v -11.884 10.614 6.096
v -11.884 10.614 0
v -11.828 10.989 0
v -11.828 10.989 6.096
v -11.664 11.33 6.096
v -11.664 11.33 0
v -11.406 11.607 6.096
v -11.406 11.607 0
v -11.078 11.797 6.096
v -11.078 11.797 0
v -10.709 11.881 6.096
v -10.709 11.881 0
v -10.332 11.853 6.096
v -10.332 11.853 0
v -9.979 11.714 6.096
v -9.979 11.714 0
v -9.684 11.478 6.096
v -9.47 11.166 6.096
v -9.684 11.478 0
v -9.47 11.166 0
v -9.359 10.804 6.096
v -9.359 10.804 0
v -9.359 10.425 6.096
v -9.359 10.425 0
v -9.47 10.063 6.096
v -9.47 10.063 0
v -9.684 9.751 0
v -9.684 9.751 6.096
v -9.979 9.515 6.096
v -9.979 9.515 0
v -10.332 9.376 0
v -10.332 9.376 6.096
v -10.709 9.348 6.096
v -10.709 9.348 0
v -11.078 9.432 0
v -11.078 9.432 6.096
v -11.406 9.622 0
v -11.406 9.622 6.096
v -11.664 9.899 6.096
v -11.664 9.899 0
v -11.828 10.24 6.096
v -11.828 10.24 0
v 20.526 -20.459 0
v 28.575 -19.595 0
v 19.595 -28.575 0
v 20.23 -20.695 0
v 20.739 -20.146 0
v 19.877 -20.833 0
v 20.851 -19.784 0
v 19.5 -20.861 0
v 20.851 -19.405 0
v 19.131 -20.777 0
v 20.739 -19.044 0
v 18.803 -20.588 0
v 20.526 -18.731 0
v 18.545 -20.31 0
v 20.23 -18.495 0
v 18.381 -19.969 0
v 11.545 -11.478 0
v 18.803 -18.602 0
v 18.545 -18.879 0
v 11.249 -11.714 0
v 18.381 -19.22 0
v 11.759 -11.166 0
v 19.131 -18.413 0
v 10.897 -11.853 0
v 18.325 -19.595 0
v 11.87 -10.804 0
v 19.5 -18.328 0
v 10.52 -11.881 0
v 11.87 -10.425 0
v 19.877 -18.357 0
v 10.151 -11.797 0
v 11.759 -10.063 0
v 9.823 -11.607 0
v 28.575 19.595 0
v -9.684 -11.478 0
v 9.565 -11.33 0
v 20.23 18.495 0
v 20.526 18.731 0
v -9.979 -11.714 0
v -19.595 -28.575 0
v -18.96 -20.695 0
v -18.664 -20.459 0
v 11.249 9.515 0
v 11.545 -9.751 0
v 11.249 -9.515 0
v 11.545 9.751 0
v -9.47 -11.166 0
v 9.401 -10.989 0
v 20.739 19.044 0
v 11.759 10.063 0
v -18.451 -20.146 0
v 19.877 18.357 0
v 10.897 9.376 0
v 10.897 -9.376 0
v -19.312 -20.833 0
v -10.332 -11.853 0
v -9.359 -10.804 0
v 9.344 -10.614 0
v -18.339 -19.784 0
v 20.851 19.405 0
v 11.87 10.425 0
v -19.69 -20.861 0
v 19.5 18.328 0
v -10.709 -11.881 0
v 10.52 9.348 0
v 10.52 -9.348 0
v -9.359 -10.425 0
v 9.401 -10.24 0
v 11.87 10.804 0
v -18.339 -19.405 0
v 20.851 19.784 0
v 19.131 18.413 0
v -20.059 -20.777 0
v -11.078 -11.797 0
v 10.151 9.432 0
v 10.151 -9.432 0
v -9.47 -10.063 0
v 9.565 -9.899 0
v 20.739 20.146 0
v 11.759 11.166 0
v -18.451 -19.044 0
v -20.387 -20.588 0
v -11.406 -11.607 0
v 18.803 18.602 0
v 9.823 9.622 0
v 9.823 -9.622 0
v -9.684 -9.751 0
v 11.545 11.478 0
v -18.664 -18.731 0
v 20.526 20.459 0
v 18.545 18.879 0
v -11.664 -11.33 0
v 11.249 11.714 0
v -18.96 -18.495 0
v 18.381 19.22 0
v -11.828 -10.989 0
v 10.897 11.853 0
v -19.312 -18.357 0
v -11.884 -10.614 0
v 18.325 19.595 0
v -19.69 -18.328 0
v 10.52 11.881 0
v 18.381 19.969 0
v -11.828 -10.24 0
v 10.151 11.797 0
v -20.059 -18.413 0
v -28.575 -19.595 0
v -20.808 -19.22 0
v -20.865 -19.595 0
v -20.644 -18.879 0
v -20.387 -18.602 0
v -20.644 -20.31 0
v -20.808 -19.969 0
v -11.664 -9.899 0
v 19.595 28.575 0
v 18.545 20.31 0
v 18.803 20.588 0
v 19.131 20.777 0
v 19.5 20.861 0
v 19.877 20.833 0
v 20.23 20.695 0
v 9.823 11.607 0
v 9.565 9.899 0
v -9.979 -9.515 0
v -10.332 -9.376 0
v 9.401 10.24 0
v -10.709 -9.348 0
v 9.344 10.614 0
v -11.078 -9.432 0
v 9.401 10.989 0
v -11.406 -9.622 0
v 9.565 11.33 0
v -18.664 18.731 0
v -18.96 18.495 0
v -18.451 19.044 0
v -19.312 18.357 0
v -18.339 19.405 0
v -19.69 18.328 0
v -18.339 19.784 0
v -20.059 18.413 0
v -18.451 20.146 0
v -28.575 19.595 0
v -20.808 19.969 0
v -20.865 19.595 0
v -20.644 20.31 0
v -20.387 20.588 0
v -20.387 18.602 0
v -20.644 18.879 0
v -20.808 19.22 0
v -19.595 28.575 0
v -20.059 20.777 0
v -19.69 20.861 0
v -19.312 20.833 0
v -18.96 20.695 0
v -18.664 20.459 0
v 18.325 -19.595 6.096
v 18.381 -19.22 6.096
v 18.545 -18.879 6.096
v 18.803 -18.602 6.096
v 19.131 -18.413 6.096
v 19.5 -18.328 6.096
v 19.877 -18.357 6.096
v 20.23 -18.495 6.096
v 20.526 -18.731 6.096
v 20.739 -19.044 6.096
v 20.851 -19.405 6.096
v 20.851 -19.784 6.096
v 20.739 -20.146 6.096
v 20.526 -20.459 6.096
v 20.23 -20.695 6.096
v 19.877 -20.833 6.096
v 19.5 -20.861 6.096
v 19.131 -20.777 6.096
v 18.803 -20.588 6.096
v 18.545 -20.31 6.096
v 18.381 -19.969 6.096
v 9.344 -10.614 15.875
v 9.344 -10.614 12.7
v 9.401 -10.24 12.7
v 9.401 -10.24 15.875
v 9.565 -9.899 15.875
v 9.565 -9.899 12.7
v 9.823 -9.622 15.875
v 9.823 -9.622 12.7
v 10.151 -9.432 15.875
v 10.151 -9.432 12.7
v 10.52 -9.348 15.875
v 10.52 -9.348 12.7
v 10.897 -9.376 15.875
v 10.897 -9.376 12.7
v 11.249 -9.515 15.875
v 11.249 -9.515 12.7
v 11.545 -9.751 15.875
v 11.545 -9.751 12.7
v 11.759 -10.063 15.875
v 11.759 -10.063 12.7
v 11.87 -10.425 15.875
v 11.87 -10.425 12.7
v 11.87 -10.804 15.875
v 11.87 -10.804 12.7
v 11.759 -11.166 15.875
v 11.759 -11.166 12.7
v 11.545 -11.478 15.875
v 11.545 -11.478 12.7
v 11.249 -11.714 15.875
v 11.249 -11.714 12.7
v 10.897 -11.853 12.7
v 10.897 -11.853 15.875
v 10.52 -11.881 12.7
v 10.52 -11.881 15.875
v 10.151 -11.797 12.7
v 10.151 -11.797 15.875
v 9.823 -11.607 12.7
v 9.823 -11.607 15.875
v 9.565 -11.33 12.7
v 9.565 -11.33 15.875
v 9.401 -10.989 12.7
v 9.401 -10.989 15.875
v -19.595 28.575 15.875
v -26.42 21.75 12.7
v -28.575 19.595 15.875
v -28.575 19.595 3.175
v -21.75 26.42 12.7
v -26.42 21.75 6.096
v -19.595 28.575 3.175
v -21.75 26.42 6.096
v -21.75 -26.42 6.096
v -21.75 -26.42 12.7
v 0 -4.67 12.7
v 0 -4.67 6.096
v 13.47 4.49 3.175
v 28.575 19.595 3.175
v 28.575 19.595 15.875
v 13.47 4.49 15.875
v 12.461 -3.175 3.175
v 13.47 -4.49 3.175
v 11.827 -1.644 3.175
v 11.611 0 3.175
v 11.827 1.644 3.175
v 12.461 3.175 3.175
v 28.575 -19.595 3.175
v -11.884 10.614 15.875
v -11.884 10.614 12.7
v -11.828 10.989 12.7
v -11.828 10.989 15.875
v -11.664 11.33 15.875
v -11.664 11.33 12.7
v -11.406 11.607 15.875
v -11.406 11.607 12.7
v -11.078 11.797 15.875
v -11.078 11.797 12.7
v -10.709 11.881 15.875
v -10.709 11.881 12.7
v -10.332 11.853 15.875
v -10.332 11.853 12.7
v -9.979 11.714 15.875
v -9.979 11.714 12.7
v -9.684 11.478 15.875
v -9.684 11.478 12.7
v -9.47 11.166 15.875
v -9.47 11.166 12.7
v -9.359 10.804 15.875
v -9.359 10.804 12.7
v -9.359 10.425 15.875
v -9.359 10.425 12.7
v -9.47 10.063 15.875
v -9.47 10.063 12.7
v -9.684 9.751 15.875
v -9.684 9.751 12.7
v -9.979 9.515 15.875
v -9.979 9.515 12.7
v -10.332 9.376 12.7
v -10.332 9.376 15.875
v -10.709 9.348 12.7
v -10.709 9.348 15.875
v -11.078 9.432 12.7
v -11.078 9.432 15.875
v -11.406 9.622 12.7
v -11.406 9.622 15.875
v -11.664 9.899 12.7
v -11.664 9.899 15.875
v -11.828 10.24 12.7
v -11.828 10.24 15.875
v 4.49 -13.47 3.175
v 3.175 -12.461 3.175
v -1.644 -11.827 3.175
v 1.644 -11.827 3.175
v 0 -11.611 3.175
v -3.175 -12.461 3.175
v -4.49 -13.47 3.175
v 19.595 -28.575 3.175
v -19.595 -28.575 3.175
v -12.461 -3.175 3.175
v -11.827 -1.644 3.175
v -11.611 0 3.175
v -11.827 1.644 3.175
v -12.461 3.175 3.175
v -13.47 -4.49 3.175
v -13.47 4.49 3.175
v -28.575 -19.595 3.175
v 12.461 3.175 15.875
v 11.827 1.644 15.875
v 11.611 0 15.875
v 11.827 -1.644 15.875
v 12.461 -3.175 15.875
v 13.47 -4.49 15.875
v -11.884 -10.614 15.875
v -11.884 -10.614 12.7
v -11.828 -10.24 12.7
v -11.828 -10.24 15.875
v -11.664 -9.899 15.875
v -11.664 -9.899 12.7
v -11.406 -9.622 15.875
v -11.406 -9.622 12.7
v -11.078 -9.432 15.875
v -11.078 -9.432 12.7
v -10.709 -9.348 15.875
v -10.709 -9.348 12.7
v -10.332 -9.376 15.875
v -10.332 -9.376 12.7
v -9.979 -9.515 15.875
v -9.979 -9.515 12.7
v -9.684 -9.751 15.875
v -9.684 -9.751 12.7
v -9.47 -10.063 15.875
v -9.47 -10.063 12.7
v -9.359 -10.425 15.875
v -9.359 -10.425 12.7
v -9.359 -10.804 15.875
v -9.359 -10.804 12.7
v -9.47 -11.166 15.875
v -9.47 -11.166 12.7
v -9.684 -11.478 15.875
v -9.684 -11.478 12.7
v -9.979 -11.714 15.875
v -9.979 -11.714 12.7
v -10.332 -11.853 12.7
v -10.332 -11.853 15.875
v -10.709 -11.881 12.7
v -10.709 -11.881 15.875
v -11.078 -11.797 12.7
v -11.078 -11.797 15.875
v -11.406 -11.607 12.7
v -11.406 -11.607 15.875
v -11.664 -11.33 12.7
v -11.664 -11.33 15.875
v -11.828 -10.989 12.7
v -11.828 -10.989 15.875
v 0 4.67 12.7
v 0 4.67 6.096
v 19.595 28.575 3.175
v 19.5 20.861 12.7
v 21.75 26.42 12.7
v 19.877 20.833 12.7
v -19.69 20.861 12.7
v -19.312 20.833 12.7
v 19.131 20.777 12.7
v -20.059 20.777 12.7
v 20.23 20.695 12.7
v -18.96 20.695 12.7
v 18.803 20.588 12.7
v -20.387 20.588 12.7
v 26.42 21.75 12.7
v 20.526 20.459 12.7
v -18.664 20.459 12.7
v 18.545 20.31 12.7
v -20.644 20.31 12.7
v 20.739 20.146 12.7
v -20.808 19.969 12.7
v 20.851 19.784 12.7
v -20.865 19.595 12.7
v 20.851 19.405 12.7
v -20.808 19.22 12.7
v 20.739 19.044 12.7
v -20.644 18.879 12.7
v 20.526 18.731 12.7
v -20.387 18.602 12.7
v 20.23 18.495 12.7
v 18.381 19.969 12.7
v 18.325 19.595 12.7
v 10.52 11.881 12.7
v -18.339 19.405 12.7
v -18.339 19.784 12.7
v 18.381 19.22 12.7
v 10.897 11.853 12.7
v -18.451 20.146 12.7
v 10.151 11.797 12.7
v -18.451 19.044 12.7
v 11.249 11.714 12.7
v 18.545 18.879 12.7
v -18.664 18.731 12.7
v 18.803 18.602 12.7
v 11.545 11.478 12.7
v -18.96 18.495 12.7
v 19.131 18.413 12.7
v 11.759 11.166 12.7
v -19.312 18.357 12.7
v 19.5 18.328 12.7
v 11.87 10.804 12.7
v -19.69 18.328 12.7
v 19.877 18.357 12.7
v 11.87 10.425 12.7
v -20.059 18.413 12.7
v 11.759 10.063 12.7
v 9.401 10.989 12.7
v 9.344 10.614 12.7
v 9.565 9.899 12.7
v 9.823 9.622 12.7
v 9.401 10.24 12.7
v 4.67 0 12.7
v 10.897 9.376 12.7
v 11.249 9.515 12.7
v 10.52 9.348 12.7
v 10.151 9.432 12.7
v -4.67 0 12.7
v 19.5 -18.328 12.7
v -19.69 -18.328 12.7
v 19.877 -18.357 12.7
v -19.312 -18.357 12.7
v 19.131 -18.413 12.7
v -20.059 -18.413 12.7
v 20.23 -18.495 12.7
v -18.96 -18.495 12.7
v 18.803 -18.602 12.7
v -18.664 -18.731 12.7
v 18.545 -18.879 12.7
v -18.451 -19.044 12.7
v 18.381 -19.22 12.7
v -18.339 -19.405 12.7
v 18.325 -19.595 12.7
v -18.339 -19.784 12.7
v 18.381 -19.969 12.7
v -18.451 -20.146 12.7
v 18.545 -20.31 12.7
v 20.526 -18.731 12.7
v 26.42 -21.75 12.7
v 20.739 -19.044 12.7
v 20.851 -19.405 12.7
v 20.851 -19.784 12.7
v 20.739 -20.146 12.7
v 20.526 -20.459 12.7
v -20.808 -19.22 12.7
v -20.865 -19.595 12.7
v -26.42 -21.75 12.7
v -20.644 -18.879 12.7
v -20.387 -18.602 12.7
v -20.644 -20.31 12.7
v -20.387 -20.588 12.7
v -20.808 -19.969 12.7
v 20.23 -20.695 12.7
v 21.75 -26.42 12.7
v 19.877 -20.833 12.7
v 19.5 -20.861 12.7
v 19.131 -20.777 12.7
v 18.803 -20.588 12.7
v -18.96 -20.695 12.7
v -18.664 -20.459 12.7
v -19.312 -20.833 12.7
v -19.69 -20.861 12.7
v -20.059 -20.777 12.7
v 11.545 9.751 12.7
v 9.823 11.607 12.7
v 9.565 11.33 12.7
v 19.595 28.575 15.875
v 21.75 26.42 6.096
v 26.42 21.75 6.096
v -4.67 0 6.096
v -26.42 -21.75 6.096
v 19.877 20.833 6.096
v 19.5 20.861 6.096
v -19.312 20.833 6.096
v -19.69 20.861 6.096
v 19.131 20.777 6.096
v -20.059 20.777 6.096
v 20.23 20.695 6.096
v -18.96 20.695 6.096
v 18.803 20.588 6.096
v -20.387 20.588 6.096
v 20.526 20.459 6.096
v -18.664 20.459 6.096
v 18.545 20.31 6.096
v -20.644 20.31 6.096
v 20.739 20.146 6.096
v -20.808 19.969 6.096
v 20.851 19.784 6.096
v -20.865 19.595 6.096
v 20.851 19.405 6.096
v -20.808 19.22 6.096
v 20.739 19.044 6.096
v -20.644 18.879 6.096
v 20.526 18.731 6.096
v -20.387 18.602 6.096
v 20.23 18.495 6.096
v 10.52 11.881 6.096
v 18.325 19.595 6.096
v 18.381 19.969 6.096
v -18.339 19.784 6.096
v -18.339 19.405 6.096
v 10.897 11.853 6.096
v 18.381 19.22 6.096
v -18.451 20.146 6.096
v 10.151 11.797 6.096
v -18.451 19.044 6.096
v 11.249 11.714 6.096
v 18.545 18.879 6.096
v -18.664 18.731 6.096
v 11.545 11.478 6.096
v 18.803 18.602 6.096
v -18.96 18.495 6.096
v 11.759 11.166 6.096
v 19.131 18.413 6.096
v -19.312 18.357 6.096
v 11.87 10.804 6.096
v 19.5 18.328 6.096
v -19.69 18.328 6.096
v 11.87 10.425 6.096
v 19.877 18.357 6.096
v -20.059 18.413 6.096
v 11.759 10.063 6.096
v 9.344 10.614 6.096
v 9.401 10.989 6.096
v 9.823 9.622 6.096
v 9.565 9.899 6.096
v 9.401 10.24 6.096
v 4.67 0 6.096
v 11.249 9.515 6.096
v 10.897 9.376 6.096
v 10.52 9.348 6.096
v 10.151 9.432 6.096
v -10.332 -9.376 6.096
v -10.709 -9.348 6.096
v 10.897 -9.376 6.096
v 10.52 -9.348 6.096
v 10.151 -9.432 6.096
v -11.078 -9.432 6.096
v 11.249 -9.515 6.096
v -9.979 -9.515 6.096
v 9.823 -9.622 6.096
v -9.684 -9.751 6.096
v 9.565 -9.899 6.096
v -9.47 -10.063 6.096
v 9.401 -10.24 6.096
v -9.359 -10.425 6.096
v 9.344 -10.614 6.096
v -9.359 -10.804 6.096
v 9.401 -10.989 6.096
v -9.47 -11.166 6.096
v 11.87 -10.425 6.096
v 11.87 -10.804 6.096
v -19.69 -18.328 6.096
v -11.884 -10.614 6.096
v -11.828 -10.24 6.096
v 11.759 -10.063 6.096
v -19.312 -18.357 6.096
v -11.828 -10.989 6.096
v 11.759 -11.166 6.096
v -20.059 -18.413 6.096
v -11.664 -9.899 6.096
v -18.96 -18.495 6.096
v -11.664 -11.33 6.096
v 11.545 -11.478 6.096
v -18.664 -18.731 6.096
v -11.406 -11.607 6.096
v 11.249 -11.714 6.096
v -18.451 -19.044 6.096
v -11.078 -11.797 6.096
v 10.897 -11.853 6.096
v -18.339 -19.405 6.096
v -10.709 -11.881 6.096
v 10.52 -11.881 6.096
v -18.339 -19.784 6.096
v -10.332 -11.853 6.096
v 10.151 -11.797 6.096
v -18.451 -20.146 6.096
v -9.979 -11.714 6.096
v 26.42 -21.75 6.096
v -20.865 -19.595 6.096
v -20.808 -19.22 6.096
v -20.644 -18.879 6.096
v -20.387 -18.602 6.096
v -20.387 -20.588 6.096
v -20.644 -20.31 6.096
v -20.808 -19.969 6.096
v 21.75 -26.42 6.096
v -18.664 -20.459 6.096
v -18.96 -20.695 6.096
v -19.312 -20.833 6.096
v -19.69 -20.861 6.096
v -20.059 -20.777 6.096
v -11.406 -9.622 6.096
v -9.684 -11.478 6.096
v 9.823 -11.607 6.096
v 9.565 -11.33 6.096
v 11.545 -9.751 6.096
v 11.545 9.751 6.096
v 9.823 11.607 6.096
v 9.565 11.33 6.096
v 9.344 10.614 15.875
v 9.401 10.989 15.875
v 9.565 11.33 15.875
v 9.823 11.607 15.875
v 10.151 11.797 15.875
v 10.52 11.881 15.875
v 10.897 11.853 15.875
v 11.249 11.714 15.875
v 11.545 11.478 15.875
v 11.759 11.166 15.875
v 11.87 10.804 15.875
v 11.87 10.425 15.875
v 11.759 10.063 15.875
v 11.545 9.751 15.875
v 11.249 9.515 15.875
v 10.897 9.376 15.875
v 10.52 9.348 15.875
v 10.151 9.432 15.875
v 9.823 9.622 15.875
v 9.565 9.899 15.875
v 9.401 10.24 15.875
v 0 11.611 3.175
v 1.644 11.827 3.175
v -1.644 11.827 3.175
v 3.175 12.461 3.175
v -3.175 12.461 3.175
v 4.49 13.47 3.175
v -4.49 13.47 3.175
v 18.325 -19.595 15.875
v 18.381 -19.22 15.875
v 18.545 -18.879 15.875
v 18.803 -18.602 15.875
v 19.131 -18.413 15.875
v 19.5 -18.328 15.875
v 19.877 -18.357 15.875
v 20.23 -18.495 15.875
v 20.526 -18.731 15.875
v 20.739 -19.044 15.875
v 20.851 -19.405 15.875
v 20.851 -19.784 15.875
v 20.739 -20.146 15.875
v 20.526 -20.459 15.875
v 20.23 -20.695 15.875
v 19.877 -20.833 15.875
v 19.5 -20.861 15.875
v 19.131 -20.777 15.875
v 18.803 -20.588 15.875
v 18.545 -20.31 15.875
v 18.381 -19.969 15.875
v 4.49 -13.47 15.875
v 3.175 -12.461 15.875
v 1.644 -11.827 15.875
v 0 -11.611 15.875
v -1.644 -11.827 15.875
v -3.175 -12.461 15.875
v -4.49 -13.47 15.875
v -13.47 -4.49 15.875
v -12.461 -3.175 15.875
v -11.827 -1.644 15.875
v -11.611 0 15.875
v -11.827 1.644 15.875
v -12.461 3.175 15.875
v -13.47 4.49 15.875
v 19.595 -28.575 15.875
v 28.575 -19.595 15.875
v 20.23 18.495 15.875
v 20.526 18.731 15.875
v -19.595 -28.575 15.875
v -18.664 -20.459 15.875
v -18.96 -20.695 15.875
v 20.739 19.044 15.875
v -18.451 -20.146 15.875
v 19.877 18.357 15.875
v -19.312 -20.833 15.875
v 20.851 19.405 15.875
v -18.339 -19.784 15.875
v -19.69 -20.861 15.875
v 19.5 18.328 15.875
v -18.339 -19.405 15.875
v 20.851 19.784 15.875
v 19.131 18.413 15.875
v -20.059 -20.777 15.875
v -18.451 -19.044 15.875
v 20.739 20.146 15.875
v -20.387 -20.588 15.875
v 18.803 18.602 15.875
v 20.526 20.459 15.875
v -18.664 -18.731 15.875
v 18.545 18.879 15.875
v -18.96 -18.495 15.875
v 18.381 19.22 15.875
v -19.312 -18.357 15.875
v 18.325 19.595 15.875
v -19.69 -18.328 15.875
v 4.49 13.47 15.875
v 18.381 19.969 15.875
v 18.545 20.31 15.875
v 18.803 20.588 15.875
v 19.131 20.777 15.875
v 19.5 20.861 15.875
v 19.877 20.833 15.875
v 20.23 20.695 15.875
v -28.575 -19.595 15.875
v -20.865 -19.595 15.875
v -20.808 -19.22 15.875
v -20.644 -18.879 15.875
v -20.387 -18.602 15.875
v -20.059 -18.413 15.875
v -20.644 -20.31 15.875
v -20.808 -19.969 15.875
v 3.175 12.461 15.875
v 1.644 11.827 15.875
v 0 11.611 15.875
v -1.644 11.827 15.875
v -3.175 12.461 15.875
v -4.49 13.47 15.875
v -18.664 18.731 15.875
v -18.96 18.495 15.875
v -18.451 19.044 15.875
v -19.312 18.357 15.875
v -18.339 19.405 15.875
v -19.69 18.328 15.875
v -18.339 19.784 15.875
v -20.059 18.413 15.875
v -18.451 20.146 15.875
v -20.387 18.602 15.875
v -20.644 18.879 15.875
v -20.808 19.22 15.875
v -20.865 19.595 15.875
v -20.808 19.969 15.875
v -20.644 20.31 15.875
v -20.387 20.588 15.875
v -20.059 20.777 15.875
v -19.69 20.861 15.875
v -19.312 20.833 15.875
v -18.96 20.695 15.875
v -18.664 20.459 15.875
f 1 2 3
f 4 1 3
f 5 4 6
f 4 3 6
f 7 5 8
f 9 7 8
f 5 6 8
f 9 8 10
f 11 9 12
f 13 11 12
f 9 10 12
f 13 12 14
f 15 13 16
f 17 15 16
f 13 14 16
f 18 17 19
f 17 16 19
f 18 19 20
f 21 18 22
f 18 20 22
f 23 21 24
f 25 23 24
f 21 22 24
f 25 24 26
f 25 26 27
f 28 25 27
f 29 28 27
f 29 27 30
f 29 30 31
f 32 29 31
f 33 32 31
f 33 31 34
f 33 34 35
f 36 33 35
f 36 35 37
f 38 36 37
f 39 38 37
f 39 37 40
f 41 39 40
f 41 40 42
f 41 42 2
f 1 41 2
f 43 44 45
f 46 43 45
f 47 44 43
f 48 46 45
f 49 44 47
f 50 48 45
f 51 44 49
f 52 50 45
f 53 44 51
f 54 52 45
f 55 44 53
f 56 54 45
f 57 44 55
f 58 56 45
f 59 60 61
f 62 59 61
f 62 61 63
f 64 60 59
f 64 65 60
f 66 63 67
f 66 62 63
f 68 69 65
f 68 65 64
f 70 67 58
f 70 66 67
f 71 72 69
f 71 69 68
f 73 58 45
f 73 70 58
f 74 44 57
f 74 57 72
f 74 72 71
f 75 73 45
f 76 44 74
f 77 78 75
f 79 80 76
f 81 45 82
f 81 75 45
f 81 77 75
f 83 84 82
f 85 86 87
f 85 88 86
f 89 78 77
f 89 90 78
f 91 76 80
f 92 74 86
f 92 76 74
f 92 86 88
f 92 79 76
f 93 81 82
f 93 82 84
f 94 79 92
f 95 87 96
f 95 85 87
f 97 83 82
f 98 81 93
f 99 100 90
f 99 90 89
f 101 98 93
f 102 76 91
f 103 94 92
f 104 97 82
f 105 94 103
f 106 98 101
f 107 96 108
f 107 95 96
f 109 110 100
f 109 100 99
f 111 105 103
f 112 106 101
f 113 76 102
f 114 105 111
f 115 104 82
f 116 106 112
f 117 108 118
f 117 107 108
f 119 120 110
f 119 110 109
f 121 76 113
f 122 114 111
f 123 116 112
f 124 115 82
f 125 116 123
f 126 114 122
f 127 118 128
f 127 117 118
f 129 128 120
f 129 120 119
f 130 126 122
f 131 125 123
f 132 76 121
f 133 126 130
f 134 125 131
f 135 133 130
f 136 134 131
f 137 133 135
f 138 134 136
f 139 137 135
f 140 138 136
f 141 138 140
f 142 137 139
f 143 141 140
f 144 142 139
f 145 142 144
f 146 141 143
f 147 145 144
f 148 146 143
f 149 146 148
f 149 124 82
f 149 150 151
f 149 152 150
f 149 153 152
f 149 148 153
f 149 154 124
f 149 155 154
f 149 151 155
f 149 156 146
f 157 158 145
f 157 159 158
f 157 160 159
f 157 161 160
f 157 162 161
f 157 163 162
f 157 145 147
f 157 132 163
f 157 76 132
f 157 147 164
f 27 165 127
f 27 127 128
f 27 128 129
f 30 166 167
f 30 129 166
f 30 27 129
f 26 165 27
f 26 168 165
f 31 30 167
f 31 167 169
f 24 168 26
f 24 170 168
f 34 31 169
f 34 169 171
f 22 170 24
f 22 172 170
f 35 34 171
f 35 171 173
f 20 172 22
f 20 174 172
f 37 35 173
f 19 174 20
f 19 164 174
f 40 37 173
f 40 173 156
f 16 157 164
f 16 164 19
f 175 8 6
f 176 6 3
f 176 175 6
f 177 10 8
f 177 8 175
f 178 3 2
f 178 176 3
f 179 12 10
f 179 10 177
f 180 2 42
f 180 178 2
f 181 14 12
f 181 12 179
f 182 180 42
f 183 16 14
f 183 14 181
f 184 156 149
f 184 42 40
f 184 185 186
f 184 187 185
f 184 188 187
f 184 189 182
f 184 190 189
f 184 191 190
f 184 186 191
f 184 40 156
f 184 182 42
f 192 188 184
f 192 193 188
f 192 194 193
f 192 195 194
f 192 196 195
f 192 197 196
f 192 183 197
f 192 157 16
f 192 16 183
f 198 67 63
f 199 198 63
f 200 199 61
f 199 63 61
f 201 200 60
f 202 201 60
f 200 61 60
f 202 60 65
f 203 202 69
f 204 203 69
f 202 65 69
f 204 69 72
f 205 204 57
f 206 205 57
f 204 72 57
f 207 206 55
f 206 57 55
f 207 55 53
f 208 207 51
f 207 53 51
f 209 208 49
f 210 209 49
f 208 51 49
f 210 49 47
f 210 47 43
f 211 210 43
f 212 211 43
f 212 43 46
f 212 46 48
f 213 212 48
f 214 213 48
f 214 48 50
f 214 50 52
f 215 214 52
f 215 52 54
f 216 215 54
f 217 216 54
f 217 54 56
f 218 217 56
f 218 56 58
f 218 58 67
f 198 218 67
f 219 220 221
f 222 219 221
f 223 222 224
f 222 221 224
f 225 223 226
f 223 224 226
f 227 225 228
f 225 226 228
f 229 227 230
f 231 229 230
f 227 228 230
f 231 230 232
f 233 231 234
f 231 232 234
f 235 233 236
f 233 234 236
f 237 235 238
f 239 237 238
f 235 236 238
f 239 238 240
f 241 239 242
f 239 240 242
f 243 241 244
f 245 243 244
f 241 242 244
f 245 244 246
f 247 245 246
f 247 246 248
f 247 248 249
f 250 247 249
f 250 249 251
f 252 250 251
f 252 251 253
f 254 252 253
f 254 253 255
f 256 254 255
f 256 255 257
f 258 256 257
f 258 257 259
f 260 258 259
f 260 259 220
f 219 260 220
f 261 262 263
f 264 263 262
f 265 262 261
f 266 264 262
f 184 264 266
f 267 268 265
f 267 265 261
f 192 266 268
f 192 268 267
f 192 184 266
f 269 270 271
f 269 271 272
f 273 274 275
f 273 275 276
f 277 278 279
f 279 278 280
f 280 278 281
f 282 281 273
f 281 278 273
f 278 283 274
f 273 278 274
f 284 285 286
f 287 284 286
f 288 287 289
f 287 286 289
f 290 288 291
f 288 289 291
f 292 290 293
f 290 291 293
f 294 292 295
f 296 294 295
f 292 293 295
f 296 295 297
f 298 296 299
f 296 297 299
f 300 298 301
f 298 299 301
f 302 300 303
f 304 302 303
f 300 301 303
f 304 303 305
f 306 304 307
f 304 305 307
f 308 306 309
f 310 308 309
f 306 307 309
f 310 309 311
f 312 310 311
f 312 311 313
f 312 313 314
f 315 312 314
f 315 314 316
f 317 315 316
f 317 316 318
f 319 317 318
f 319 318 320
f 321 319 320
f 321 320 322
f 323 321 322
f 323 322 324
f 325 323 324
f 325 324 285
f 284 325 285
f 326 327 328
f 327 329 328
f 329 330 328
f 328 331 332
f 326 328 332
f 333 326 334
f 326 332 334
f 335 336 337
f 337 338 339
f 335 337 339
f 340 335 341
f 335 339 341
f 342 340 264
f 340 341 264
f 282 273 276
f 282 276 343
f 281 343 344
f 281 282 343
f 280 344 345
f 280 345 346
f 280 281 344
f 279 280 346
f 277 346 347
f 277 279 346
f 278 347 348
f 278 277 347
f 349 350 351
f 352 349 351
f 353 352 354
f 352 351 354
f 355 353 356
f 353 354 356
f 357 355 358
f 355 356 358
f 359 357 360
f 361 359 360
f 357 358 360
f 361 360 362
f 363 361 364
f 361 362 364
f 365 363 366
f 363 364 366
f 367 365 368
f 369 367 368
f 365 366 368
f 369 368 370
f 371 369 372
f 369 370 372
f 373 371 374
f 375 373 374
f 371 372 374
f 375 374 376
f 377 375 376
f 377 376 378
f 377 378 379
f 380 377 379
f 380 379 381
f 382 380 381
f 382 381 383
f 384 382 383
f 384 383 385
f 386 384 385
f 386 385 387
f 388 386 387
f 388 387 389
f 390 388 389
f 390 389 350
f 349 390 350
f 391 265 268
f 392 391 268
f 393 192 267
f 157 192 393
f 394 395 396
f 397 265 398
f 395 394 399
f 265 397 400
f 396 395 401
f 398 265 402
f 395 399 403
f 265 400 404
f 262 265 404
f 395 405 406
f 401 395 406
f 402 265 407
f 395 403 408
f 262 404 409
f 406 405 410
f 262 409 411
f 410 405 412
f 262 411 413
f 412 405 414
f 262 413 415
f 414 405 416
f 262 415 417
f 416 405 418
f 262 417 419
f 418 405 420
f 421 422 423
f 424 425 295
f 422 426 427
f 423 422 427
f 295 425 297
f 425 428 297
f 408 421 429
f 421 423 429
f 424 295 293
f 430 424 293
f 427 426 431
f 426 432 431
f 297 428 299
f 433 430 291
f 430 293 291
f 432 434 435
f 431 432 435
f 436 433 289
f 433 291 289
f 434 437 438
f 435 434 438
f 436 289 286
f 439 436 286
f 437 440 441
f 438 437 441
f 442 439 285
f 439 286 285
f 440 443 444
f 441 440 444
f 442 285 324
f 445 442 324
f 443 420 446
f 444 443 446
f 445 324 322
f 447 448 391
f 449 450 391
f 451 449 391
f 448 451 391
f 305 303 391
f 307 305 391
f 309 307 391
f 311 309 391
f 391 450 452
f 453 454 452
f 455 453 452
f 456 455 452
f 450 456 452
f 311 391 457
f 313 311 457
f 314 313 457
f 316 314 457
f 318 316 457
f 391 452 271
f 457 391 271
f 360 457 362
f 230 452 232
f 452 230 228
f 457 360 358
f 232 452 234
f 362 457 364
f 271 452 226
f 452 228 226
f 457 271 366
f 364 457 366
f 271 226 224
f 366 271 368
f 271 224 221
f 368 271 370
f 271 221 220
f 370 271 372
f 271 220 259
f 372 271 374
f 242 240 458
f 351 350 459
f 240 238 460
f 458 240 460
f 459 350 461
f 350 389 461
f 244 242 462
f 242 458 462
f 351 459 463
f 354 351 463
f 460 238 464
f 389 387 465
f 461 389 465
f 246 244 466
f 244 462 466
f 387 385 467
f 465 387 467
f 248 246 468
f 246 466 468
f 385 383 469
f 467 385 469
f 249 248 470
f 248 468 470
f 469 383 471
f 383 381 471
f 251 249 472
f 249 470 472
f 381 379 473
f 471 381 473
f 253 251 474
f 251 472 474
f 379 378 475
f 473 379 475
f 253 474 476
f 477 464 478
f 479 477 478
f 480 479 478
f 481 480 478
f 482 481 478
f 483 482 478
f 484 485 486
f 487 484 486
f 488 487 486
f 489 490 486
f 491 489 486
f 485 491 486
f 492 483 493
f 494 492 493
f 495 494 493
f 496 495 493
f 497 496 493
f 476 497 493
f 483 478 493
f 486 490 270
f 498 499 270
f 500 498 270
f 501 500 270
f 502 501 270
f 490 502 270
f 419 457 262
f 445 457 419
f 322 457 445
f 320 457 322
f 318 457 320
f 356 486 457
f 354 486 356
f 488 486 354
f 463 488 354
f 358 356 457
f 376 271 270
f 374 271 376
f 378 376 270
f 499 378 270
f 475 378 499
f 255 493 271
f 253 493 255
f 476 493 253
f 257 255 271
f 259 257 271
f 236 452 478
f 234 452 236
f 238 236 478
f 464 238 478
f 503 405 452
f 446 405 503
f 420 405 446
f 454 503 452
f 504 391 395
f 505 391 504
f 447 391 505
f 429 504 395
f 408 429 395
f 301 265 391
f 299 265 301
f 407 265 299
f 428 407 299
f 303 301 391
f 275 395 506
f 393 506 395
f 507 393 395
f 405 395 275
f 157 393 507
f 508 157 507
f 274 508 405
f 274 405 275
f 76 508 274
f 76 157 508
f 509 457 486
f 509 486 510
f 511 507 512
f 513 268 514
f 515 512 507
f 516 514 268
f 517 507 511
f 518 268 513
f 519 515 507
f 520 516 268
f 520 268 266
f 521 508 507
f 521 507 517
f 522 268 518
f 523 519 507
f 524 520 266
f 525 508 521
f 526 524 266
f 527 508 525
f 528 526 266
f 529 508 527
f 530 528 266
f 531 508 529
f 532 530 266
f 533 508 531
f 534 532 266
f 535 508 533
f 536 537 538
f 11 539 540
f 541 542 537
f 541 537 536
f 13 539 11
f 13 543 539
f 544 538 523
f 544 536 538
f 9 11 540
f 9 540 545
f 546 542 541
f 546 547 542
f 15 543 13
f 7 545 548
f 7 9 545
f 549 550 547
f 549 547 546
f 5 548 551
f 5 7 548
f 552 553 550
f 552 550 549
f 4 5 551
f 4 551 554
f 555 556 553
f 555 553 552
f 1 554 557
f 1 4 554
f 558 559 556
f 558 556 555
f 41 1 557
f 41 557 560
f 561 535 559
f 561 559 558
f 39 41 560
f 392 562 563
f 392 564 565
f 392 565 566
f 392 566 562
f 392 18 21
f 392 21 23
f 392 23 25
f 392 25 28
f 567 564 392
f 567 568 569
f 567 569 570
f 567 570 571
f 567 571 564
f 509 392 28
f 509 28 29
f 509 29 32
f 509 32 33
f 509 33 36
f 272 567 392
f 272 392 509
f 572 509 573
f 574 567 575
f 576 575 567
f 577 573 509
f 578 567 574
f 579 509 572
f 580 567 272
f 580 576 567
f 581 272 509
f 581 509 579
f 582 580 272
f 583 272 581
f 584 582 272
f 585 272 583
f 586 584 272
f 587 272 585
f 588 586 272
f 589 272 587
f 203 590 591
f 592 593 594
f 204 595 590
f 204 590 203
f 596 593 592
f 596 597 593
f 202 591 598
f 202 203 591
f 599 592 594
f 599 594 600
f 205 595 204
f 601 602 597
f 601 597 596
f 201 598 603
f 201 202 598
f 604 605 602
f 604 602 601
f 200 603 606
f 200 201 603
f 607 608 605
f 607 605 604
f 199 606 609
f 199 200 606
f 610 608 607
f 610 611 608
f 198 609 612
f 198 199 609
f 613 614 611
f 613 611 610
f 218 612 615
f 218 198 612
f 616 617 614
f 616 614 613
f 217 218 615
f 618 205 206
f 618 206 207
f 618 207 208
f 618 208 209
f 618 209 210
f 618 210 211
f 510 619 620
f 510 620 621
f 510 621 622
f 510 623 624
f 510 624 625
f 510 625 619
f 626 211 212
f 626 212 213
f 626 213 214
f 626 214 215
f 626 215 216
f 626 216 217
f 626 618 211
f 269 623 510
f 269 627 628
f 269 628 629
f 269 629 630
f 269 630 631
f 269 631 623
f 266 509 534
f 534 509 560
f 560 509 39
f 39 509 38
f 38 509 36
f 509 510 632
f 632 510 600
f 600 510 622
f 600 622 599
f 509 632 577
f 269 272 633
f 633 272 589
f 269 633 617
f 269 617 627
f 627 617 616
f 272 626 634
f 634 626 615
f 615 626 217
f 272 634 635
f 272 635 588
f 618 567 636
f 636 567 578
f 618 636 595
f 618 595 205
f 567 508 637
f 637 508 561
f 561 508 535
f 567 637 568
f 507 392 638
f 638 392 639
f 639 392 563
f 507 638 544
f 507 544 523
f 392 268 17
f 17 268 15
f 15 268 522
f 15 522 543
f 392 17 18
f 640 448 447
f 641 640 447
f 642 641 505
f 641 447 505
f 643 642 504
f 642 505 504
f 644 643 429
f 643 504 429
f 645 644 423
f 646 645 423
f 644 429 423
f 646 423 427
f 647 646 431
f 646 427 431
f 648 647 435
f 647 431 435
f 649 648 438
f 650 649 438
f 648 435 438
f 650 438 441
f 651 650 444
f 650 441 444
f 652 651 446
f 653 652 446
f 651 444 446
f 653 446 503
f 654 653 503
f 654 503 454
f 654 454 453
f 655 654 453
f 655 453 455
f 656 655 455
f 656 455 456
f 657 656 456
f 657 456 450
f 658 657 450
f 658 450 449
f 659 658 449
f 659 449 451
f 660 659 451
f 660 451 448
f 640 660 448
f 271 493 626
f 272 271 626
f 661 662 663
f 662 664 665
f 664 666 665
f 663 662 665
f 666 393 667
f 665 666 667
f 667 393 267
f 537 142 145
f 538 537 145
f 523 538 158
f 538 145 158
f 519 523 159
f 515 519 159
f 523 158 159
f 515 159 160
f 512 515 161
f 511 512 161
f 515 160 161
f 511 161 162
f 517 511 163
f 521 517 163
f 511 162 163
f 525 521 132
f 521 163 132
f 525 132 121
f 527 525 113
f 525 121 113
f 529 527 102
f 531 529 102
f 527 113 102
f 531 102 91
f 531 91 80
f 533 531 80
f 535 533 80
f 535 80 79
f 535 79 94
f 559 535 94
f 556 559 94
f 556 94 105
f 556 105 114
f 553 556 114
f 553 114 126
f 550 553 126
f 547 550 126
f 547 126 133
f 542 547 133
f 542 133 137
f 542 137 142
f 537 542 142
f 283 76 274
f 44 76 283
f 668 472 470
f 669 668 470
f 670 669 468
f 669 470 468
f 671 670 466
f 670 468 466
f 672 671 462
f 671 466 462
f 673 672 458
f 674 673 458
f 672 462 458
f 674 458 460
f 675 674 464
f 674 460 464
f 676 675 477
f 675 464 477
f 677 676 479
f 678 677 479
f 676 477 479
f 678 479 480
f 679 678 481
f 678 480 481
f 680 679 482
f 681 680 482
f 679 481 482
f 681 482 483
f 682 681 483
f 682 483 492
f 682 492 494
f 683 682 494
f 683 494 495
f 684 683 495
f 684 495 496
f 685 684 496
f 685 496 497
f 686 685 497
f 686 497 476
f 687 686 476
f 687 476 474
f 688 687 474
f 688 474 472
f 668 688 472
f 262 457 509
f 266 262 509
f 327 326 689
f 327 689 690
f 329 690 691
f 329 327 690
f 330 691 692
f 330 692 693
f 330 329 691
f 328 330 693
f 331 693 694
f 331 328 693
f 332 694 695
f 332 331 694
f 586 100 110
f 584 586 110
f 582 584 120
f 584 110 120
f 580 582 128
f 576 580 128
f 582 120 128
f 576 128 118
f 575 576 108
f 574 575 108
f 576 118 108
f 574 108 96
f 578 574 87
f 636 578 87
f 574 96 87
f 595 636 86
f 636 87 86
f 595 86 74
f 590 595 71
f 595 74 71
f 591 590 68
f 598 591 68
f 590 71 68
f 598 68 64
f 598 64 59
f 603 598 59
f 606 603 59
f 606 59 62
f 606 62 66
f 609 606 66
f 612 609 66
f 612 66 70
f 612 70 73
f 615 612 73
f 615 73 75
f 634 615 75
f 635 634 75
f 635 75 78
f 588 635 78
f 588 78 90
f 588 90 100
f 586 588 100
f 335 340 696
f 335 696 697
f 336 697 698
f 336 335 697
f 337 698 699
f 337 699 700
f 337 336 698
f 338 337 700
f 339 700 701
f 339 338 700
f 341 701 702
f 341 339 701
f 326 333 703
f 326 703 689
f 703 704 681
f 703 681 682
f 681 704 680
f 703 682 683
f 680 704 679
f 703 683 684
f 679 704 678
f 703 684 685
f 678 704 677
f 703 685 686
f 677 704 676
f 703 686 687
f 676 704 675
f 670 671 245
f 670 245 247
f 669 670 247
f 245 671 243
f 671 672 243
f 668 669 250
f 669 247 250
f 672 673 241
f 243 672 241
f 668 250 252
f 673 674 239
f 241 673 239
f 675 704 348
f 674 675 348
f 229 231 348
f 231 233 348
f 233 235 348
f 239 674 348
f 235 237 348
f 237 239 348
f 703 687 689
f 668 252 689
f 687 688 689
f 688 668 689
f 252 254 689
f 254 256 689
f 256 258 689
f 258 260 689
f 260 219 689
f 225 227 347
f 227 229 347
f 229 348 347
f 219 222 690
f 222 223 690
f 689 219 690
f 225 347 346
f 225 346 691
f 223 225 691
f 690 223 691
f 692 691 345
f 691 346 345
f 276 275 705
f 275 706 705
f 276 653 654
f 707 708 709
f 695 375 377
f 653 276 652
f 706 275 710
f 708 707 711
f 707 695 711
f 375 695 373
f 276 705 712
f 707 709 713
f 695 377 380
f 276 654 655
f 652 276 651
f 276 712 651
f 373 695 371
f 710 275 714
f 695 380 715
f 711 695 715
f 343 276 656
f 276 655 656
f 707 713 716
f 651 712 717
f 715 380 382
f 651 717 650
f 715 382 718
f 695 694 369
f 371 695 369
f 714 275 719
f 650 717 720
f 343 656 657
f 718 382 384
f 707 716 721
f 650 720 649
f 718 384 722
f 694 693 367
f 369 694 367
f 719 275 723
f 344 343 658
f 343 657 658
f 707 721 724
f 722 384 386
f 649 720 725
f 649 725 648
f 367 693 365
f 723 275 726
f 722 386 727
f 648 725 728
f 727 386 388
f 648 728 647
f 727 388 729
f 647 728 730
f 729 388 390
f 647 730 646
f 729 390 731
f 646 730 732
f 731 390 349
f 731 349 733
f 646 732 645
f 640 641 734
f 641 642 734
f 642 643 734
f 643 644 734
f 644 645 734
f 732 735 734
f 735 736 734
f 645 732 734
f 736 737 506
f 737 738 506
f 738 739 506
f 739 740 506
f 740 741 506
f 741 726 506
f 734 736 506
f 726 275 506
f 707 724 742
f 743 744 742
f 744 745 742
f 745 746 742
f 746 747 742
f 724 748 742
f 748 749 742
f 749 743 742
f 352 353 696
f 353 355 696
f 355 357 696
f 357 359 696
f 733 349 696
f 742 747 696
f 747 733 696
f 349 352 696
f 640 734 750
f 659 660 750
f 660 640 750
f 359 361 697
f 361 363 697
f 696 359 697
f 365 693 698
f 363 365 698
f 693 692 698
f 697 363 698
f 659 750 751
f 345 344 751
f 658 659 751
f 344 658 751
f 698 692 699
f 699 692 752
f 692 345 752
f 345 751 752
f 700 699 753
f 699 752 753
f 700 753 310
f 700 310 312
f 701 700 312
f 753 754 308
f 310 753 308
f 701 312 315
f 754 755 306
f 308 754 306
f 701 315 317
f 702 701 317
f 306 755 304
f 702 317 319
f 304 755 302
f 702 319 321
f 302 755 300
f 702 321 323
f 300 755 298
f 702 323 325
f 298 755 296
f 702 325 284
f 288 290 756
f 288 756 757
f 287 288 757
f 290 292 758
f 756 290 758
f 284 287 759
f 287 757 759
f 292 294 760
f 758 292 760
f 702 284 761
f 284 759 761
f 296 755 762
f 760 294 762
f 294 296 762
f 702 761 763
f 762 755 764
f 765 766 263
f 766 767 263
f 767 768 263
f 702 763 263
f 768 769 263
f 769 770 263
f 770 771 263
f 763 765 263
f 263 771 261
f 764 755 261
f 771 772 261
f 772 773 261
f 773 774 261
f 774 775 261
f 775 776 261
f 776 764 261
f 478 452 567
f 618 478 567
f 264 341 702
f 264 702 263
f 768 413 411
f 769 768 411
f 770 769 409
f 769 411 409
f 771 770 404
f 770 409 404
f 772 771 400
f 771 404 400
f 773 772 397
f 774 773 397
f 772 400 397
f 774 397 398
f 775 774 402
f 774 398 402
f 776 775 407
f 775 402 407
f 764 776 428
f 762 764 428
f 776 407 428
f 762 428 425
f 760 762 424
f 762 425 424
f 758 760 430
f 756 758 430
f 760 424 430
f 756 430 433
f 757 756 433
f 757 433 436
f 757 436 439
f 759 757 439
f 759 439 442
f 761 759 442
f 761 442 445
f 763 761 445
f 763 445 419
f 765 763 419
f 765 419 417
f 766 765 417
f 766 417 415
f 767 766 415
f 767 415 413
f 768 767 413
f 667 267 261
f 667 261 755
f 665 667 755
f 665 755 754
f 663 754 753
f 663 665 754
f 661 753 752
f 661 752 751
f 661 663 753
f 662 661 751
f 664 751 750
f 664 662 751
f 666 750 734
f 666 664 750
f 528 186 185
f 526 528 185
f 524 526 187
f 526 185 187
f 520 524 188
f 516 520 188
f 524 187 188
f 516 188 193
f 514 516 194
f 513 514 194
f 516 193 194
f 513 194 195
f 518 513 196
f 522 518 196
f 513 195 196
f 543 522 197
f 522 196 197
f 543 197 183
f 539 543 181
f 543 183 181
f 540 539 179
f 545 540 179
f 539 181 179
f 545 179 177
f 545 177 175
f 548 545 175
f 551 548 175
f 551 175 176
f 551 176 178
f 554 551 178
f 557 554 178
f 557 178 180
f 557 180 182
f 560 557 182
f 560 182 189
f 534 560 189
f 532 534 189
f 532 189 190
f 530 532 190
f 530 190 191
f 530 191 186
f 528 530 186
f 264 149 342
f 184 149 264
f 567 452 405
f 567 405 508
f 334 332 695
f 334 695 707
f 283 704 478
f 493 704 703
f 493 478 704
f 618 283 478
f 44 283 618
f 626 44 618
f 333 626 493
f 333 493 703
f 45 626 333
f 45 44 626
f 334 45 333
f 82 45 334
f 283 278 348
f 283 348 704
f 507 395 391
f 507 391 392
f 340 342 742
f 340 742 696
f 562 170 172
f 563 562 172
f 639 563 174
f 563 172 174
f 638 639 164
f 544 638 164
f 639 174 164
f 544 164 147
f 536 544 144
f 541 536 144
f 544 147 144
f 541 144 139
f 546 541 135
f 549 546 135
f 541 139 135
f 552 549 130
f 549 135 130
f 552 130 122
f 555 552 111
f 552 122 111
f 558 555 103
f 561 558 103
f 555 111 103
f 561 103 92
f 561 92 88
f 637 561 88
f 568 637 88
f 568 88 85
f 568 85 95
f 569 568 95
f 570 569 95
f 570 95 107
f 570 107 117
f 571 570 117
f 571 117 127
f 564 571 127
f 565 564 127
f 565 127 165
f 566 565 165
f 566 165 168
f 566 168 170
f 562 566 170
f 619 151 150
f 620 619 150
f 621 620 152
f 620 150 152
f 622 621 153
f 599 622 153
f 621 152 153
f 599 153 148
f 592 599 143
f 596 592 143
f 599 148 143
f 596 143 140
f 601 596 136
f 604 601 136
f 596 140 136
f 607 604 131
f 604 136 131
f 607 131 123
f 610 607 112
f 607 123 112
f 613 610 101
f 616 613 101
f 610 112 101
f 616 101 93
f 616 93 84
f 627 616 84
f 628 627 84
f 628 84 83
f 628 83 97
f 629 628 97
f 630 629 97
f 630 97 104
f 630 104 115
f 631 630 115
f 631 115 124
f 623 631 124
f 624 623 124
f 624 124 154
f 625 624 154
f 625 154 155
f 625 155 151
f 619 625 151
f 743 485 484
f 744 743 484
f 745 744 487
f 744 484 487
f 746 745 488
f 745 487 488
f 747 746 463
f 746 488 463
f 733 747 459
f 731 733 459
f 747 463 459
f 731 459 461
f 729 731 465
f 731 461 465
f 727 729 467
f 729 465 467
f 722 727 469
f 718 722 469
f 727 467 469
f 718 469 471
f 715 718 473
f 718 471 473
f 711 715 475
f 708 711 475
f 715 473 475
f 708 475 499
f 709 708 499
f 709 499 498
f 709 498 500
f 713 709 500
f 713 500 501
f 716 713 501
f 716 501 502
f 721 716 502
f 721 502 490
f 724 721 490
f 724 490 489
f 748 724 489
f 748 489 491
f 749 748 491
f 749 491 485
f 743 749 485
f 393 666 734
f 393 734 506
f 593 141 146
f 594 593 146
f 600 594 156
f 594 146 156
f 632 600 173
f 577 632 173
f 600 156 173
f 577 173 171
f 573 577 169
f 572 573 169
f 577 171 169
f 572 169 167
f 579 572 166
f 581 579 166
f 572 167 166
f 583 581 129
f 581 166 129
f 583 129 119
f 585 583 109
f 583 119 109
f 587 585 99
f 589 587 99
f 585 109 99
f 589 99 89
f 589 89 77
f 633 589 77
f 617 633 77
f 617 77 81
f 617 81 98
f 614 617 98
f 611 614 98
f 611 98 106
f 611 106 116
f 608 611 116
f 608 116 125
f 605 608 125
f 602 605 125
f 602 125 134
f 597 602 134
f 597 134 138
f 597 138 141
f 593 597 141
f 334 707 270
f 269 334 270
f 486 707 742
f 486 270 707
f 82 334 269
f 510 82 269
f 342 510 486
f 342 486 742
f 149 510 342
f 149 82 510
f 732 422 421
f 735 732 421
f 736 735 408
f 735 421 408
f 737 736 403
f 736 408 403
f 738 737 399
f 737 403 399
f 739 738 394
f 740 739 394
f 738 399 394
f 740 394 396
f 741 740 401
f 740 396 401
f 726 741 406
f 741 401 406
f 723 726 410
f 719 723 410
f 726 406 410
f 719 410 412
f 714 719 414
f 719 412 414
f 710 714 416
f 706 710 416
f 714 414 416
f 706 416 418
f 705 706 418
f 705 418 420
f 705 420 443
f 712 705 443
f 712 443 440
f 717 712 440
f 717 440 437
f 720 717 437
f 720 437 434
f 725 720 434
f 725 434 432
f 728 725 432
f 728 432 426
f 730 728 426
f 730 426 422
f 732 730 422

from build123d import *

# Parameters (mm, degrees)
BOSS_EXTRUDE1_DEPTH = 3.175
BOSS_EXTRUDE2_DEPTH = 12.7
SKETCH3_W           = 6.604
SKETCH3_H           = 6.604
CUT_EXTRUDE1_DEPTH  = 77.145517599
SKETCH4_R           = 1.27
CUT_EXTRUDE3_DEPTH  = 25.4


with BuildPart() as part:
    # Sketch1 → Boss-Extrude1 (new body)
    with BuildSketch(Plane.XY):
        Polygon((-28.575, 19.594743879), (-19.594743879, 28.575), (19.594743879, 28.575), (28.575, 19.594743879), (28.575, -19.594743879), (19.594743879, -28.575), (-19.594743879, -28.575), (-28.575, -19.594743879), align=None)
    extrude(amount=BOSS_EXTRUDE1_DEPTH)

    # Sketch2 → Boss-Extrude2 (add)
    with BuildSketch(Plane.XY.offset(3.175)):
        with BuildLine():
            Line((-28.575, 19.594743879), (-19.594743879, 28.575))
            Line((-19.594743879, 28.575), (-4.490128061, 13.470384182))
            ThreePointArc((-4.490128061, 13.470384182), (0, 11.610512242), (4.490128061, 13.470384182))
            Line((4.490128061, 13.470384182), (19.594743879, 28.575))
            Line((19.594743879, 28.575), (28.575, 19.594743879))
            Line((28.575, 19.594743879), (13.470384182, 4.490128061))
            ThreePointArc((13.470384182, 4.490128061), (11.610512242, 0), (13.470384182, -4.490128061))
            Line((13.470384182, -4.490128061), (28.575, -19.594743879))
            Line((28.575, -19.594743879), (19.594743879, -28.575))
            Line((19.594743879, -28.575), (4.490128061, -13.470384182))
            ThreePointArc((4.490128061, -13.470384182), (0, -11.610512242), (-4.490128061, -13.470384182))
            Line((-4.490128061, -13.470384182), (-19.594743879, -28.575))
            Line((-19.594743879, -28.575), (-28.575, -19.594743879))
            Line((-28.575, -19.594743879), (-13.470384182, -4.490128061))
            ThreePointArc((-13.470384182, -4.490128061), (-11.610512242, 0), (-13.470384182, 4.490128061))
            Line((-13.470384182, 4.490128061), (-28.575, 19.594743879))
        make_face()
    extrude(amount=BOSS_EXTRUDE2_DEPTH)

    # Sketch3 → Cut-Extrude1 (cut, symmetric)
    with BuildSketch(Plane(origin=(24.084871939, 24.084871939, 0), x_dir=(0, 0, -1), z_dir=(0.7071067811865472, 0.7071067811865479, 0))):
        with Locations((-9.398, 0)):
            Rectangle(SKETCH3_W, SKETCH3_H)
    cut_extrude1 = extrude(amount=CUT_EXTRUDE1_DEPTH, both=True, mode=Mode.SUBTRACT)

    # Mirror1: Cut-Extrude1 across plane
    add(cut_extrude1.mirror(Plane.ZX), mode=Mode.SUBTRACT)

    # Sketch4 → Cut-Extrude3 (cut)
    with BuildSketch(Plane(origin=(0, 0, 0), x_dir=(-1, 0, 0), z_dir=(0, 0, -1))):
        with Locations((-19.594743879, 19.594743879)):
            Circle(SKETCH4_R)
        with Locations((-10.614487758, 10.614487758)):
            Circle(SKETCH4_R)
        with Locations((10.614487758, 10.614487758)):
            Circle(SKETCH4_R)
        with Locations((19.594743879, 19.594743879)):
            Circle(SKETCH4_R)
        with Locations((19.594743879, -19.594743879)):
            Circle(SKETCH4_R)
        with Locations((10.614487758, -10.614487758)):
            Circle(SKETCH4_R)
        with Locations((-19.594743879, -19.594743879)):
            Circle(SKETCH4_R)
        with Locations((-10.614487758, -10.614487758)):
            Circle(SKETCH4_R)
    extrude(amount=-CUT_EXTRUDE3_DEPTH, mode=Mode.SUBTRACT)


solid = part.part
